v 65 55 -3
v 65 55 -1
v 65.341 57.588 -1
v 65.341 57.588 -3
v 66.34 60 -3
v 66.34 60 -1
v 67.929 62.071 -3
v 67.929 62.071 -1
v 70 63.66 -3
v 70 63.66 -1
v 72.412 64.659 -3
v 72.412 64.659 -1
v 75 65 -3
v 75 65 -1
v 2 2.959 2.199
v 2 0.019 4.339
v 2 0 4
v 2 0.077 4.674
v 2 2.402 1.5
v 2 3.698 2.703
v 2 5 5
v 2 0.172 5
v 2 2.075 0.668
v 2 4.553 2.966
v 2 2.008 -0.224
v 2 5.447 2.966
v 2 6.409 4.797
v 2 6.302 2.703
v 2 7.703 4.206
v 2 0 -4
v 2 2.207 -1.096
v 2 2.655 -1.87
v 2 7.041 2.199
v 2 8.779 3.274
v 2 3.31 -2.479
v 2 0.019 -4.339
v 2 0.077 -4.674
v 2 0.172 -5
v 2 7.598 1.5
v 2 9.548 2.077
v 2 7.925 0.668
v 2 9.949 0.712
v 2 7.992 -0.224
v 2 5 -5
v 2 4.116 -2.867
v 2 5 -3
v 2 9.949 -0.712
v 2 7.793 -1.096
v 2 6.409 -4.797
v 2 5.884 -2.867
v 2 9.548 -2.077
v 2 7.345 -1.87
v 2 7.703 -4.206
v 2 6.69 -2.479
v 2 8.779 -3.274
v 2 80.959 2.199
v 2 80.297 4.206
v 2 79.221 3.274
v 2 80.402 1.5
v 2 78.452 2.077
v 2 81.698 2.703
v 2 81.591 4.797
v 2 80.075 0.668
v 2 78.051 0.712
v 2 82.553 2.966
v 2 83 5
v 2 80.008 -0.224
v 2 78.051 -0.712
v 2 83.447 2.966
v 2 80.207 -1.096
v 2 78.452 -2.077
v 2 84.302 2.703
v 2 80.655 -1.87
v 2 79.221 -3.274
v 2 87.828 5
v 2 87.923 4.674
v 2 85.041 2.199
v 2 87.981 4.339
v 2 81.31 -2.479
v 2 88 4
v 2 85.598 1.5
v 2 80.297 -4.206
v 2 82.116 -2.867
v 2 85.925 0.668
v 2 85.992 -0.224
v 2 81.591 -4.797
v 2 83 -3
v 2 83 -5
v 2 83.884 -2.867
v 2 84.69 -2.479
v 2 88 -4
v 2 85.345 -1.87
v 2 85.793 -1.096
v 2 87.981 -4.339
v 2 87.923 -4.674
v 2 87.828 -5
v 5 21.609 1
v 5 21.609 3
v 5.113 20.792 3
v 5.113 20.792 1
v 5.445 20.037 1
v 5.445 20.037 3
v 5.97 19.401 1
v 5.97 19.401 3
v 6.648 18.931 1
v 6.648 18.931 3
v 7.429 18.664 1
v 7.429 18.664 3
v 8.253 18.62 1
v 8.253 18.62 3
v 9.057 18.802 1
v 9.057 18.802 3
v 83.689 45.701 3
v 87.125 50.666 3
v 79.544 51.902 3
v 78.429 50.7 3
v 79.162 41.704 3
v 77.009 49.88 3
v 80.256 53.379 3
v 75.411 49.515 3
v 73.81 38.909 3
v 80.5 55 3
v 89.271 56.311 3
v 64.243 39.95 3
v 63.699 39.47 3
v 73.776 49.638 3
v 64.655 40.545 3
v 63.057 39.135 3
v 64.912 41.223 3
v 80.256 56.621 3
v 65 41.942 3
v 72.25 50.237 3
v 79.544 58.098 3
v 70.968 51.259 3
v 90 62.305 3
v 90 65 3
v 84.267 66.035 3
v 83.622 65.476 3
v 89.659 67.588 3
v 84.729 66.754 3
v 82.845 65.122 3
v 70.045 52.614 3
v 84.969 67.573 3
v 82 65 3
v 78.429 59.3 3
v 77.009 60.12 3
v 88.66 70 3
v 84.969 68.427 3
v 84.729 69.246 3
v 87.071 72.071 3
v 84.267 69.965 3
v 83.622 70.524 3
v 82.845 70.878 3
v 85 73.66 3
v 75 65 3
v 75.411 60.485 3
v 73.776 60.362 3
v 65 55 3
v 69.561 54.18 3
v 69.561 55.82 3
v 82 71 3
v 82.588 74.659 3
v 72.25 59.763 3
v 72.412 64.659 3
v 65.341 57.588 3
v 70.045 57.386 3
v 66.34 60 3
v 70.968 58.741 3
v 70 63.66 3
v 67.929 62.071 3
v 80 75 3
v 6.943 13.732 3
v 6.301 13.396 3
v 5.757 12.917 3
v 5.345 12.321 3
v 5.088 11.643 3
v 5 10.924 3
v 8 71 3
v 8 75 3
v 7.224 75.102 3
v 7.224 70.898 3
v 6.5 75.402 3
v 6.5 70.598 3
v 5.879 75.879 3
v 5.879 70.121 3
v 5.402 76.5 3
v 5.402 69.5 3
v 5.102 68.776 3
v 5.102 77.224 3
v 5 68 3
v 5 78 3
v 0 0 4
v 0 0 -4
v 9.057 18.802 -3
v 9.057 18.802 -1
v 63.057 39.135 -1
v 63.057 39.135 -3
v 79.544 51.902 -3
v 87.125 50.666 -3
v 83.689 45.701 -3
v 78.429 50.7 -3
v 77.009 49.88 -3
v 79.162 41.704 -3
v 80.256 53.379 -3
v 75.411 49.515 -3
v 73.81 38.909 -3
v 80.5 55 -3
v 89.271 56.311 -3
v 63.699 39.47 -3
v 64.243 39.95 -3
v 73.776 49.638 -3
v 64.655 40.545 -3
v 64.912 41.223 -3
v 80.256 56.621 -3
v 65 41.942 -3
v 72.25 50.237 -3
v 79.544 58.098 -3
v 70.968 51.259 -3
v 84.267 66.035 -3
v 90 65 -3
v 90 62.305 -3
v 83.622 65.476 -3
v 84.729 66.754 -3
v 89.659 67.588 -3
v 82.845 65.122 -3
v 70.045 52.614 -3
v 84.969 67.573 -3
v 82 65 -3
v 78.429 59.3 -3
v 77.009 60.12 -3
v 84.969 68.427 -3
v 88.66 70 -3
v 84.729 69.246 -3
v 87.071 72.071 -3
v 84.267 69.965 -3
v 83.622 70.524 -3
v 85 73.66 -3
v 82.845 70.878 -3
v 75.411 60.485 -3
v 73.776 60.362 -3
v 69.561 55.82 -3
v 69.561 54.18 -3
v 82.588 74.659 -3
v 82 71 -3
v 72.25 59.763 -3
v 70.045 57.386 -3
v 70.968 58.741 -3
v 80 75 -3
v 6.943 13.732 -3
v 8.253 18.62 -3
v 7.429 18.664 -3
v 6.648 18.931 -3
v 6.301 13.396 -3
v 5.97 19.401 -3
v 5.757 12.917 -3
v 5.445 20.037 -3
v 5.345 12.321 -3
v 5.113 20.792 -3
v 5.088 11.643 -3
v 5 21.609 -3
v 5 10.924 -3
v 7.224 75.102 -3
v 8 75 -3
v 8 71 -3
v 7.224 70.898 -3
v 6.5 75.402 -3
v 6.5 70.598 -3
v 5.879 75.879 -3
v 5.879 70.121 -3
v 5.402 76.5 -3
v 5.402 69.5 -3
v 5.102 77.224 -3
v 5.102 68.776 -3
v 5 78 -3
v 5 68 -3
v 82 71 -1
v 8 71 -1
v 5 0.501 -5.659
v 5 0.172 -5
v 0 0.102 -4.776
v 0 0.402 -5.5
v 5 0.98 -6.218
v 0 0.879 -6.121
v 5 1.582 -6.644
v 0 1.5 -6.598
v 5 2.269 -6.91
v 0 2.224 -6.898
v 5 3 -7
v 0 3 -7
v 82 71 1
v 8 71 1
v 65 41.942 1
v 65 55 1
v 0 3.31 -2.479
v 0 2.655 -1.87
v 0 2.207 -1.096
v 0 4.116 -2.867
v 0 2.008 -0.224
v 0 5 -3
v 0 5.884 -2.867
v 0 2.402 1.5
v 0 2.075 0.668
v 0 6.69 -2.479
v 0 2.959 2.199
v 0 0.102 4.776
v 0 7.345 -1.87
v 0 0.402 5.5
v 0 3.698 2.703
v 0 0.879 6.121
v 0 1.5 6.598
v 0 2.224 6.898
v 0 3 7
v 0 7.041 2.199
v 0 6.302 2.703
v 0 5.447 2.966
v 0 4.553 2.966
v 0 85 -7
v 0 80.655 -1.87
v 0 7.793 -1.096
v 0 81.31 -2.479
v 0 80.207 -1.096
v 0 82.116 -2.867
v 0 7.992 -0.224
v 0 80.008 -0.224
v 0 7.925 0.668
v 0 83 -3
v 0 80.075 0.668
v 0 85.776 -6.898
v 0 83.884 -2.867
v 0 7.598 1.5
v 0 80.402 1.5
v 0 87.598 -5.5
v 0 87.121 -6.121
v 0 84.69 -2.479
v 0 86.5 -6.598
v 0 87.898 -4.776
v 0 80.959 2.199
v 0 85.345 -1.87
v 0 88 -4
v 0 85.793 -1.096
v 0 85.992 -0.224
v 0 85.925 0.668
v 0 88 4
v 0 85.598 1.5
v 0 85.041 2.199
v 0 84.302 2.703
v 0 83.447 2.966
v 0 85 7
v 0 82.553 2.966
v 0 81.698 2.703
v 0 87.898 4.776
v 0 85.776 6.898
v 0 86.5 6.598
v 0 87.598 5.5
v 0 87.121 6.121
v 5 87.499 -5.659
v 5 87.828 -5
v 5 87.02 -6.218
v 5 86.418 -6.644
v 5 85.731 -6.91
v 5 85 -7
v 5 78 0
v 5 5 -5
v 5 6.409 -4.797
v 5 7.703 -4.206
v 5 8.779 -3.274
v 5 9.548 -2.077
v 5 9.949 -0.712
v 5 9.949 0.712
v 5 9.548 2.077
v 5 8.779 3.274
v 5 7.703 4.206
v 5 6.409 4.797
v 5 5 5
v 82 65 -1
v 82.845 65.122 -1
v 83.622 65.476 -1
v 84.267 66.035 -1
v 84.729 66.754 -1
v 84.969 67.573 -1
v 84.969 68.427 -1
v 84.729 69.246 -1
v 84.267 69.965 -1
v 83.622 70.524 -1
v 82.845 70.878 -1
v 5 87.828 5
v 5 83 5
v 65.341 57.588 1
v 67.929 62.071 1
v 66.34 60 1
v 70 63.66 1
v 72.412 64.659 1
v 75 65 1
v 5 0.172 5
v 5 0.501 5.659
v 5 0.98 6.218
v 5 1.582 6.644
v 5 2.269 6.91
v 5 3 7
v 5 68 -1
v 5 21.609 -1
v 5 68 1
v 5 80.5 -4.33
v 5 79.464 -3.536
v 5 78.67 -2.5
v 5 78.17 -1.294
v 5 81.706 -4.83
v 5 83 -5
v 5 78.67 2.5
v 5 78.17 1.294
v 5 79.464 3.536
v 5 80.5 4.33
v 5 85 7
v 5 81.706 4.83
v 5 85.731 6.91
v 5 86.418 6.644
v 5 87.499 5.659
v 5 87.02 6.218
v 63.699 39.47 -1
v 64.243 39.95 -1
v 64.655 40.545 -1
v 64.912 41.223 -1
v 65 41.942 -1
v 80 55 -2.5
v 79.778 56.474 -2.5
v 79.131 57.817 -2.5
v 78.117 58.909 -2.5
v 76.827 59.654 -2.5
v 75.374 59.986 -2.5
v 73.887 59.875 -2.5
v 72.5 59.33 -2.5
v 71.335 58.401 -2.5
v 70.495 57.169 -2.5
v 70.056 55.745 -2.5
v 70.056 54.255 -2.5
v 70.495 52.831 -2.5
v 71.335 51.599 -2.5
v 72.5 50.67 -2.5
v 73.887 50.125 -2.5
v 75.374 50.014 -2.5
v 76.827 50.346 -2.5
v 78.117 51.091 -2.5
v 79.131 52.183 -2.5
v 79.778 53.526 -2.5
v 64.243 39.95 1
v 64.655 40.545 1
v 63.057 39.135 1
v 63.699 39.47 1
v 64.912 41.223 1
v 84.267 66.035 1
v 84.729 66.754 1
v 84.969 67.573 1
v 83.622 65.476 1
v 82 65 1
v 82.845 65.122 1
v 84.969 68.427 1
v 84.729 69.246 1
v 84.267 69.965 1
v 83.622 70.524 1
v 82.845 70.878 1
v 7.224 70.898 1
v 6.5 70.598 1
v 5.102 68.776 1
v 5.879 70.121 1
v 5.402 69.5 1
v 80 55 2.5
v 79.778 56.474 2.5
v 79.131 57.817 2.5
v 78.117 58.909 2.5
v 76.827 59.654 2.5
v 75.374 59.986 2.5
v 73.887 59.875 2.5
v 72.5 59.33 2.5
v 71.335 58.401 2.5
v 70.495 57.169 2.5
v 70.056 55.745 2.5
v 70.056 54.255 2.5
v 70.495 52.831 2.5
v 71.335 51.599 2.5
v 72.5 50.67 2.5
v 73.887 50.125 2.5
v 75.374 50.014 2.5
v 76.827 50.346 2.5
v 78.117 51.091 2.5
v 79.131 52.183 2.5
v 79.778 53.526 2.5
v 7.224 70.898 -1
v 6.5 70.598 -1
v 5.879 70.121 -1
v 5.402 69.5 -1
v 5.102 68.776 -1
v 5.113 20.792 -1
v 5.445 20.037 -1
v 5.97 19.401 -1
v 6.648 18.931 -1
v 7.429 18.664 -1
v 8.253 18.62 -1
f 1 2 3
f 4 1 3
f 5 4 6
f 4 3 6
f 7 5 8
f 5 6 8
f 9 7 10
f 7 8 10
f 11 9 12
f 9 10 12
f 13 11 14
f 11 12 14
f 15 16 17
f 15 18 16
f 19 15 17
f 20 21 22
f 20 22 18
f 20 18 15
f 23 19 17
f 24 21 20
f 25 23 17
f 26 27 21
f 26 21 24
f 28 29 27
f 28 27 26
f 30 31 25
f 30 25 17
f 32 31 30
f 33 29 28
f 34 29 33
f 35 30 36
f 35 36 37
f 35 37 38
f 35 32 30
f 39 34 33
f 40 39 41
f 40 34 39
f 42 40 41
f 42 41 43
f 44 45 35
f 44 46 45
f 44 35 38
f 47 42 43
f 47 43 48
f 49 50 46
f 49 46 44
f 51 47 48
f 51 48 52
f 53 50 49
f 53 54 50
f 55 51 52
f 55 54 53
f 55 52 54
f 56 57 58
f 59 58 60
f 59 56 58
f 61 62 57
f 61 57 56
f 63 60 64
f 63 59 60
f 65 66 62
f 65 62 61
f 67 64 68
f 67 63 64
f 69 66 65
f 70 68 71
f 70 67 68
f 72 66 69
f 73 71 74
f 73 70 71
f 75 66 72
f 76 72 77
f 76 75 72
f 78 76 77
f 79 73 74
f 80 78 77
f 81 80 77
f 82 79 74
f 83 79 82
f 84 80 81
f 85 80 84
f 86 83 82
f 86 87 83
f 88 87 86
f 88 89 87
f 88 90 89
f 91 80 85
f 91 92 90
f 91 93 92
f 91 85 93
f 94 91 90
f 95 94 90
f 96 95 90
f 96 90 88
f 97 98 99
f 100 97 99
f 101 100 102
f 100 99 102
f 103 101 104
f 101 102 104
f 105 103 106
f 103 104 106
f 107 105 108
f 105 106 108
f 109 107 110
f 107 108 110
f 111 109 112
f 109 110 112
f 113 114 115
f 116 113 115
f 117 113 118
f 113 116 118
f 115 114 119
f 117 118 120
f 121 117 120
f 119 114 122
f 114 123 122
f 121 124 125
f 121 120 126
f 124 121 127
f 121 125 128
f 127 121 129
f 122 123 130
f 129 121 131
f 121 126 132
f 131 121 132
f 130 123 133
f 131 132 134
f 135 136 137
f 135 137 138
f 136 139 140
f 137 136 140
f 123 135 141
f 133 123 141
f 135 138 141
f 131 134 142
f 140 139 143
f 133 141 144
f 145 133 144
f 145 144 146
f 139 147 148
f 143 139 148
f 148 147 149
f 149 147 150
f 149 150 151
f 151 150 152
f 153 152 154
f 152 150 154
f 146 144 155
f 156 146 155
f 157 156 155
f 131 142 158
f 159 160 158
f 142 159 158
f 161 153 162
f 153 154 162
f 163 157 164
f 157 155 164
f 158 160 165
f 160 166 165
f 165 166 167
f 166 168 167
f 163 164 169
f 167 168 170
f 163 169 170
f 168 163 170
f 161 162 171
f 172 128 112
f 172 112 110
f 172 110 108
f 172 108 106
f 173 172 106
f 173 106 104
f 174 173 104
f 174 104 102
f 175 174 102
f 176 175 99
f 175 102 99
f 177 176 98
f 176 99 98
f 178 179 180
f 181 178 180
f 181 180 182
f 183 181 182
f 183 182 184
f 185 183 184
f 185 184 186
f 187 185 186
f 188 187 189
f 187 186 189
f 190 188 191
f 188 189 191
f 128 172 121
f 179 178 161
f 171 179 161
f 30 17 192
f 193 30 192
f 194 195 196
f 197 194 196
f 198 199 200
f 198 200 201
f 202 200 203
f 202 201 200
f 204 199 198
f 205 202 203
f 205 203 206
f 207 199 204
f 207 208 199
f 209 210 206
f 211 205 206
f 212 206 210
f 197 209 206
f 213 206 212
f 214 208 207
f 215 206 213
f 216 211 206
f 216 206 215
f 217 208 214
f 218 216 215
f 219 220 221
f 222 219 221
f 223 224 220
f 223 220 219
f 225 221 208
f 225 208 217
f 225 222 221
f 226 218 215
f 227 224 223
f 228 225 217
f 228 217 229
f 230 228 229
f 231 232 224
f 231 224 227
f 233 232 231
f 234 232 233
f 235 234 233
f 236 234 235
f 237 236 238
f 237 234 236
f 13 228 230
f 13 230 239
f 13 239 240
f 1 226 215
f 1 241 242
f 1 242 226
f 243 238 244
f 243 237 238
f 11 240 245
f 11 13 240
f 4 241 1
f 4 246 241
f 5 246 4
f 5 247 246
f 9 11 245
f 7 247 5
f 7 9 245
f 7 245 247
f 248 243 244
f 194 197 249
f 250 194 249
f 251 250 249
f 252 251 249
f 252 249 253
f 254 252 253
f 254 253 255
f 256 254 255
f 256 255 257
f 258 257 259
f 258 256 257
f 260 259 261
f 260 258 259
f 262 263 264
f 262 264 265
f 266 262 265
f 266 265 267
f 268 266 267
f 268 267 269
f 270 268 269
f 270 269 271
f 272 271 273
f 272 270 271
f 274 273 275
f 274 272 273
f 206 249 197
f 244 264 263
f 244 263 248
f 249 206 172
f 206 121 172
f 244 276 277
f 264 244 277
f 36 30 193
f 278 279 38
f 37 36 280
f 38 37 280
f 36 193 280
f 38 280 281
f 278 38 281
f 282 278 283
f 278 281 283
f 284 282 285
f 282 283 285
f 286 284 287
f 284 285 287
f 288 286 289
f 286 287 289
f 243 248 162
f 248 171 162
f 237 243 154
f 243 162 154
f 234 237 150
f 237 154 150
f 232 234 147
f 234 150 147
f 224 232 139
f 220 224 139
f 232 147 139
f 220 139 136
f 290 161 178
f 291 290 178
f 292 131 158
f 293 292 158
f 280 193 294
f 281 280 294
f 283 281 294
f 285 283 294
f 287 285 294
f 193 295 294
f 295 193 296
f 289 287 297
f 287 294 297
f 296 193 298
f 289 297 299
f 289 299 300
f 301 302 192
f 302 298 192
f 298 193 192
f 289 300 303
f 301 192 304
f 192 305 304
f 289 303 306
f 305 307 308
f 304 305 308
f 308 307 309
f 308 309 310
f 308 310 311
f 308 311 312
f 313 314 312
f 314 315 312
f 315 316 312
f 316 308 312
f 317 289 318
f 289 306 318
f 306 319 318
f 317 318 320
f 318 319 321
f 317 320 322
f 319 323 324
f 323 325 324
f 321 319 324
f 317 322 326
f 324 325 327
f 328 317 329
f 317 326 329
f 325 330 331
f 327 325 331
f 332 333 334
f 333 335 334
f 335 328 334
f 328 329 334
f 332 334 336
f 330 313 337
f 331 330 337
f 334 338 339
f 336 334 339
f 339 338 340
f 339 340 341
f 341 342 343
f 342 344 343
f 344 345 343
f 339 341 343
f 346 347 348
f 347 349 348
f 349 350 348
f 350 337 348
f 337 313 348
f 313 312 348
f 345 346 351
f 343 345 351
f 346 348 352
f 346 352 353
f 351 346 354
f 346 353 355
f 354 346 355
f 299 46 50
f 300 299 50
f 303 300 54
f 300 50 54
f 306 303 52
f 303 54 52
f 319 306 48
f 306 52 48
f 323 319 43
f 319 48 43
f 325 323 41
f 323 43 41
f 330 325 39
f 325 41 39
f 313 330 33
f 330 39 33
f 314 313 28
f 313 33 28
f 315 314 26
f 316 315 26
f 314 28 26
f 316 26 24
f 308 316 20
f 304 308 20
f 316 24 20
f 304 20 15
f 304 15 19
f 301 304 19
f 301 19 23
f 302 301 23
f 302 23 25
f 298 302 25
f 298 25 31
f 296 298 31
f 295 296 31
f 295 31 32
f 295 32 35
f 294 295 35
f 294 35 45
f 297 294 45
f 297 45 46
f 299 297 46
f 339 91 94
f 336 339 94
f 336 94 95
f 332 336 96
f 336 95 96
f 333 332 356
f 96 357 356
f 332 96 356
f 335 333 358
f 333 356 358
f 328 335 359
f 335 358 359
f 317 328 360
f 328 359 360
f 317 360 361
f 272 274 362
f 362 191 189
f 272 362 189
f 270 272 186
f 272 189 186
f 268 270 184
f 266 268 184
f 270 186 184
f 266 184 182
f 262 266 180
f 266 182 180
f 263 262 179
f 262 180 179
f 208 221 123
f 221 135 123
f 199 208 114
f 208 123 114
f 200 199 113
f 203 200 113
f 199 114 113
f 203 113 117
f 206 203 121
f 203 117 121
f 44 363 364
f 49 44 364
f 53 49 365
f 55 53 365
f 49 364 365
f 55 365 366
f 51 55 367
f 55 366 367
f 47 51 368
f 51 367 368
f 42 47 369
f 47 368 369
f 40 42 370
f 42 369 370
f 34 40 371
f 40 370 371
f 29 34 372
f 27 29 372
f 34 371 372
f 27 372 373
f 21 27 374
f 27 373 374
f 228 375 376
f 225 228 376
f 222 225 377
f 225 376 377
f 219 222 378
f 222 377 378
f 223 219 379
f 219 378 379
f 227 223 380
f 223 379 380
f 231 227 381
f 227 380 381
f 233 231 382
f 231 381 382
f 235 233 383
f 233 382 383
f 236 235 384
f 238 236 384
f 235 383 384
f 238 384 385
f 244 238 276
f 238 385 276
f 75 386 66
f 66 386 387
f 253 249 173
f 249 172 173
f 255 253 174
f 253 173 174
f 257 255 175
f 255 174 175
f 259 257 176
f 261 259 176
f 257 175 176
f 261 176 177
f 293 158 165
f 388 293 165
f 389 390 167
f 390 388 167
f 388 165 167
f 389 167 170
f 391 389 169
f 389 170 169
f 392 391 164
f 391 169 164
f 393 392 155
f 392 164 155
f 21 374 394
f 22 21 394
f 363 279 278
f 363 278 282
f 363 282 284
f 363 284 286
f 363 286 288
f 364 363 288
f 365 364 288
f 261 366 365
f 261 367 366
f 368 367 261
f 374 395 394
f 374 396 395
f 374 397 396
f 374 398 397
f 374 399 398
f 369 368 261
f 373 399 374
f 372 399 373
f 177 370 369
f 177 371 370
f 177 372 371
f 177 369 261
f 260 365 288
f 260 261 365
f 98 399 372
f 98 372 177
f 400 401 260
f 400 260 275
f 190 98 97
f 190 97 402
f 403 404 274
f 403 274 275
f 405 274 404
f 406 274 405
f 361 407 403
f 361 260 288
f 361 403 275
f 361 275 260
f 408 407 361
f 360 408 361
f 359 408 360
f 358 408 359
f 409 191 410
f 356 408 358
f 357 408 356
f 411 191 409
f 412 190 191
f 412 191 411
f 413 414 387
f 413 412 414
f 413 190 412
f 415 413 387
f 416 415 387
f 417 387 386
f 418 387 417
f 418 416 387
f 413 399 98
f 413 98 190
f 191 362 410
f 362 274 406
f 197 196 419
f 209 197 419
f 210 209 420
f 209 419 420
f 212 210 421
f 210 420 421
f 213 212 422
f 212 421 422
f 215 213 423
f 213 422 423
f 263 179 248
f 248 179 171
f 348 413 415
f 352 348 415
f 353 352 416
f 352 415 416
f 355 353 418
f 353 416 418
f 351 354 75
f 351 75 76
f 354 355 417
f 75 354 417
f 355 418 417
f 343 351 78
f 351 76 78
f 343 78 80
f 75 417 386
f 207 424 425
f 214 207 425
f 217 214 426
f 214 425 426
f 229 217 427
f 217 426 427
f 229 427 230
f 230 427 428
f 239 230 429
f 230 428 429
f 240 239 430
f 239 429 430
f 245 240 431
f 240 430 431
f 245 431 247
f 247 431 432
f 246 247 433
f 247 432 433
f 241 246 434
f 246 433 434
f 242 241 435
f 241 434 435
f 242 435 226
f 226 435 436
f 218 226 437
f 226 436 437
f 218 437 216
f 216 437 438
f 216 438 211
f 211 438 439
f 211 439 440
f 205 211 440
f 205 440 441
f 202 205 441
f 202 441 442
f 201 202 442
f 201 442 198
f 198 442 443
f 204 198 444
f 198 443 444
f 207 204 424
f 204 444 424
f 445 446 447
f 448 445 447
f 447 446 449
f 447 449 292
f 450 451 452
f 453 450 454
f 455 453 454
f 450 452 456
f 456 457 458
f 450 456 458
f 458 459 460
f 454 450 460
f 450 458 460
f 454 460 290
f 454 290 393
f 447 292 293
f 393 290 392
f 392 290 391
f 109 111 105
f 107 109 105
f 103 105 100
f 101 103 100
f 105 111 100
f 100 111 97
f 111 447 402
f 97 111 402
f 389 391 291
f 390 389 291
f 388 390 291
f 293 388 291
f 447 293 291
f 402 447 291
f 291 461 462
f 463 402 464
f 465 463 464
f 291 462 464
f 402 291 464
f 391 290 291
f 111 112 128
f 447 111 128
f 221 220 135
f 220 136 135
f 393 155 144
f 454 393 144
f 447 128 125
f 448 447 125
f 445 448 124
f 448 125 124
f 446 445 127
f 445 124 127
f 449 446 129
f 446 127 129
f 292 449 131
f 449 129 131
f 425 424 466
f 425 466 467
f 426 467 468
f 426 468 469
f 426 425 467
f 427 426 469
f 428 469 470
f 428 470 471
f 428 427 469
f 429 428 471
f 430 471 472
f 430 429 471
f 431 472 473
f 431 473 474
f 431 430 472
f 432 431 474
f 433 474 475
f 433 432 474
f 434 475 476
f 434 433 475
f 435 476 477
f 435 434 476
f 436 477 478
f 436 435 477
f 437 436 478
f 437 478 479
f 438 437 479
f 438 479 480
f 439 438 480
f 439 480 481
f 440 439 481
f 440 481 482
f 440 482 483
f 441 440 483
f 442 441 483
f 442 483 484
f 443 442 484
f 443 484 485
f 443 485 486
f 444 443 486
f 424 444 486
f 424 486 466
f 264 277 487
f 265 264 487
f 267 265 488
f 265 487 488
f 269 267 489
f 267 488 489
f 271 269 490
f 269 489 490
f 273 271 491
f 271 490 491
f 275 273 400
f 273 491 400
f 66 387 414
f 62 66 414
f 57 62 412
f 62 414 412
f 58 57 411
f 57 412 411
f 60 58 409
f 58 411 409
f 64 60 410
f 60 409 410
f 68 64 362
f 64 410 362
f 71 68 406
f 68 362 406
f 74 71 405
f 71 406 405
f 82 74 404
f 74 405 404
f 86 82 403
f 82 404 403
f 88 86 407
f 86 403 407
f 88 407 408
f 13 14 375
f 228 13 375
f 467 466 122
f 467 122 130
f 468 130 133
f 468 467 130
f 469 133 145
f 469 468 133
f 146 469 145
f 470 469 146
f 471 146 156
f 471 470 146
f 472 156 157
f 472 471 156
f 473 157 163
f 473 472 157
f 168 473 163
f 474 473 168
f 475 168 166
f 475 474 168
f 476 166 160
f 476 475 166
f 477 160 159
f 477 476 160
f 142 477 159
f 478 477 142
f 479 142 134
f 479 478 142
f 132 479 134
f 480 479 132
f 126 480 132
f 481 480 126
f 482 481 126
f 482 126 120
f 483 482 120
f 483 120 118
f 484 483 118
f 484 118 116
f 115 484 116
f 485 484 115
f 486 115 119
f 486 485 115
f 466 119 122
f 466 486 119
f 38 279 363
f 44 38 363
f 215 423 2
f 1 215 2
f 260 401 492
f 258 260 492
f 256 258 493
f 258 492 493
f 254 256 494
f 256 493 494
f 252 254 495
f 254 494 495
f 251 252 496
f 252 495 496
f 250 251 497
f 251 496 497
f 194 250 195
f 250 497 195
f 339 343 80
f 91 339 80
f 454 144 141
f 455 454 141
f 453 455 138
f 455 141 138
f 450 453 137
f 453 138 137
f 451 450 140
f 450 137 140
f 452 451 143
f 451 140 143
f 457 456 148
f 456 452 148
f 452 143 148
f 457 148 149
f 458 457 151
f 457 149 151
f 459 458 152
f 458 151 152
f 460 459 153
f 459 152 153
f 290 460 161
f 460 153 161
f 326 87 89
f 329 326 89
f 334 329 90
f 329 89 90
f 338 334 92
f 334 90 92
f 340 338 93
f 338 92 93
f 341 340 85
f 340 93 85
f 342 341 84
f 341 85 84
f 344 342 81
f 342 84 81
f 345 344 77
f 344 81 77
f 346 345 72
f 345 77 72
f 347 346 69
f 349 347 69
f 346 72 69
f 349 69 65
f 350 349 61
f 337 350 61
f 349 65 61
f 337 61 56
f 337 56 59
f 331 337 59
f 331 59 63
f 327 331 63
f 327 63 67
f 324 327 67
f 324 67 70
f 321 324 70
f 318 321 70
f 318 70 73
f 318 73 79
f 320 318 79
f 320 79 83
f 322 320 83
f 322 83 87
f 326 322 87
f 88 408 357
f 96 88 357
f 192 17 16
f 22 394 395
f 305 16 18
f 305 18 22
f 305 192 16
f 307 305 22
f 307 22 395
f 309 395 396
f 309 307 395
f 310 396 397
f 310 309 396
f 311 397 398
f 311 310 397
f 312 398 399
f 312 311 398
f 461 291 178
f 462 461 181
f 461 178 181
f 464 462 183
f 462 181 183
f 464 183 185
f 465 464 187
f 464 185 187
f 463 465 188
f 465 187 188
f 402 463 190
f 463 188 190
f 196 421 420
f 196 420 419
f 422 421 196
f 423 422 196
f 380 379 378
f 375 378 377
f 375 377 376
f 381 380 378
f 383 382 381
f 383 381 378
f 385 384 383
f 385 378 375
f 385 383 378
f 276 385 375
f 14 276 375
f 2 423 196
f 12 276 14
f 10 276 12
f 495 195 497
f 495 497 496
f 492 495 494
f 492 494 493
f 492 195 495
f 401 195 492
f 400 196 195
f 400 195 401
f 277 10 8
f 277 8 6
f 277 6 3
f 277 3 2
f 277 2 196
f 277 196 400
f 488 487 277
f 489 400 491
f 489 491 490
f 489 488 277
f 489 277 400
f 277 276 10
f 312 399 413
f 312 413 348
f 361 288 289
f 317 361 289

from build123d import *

# Parameters (mm, degrees)
EXTRUDE_2_DEPTH     = 7
SKETCH_2_10_R       = 5
EXTRUDE_6_DEPTH     = 3
EXTRUDE_7_DEPTH     = 1
SKETCH_5_R          = 3
CUT_EXTRUDE_1_DEPTH = 3
SKETCH_5_5_R        = 3
CUT_EXTRUDE_2_DEPTH = 123.547949799
FILLET_1_R          = 3
CHAMFER_2_SIZE      = 0.5


with BuildPart() as part:
    # Эскиз2 → Бобышка-Вытянуть2 (new, symmetric)
    with BuildSketch(Plane.XY):
        Polygon((5, 21.609375634), (5, 68), (5, 78), (5, 88), (0, 88), (0, 0), (5, 0), (5, 10.923979425), align=None)
    extrude(amount=EXTRUDE_2_DEPTH, both=True)

    # Эскиз2<10> → Бобышка-Вытянуть6 (add, symmetric)
    with BuildSketch(Plane.XY):
        with BuildLine():
            Line((82, 65), (75, 65))
            ThreePointArc((75, 65), (67.928932188, 62.071067812), (65, 55))
            Line((65, 55), (65, 41.942144818))
            ThreePointArc((65, 41.942144818), (64.466923843, 40.2350166), (63.057142165, 39.134574615))
            Line((63.057142165, 39.134574615), (9.057142165, 18.801805431))
            ThreePointArc((9.057142165, 18.801805431), (6.292871782, 19.142451791), (5, 21.609375634))
            Line((5, 21.609375634), (5, 10.923979425))
            ThreePointArc((5, 10.923979425), (5.533076157, 12.631107643), (6.942857835, 13.731549628))
            Line((6.942857835, 13.731549628), (73.80951804, 38.909037925))
            ThreePointArc((73.80951804, 38.909037925), (85.557698692, 48.079387798), (90, 62.305456282))
            Line((90, 62.305456282), (90, 65))
            ThreePointArc((90, 65), (87.071067812, 72.071067812), (80, 75))
            Line((80, 75), (8, 75))
            ThreePointArc((8, 75), (5.878679656, 75.878679656), (5, 78))
            Line((5, 78), (5, 68))
            ThreePointArc((5, 68), (5.878679656, 70.121320344), (8, 71))
            Line((8, 71), (82, 71))
            ThreePointArc((82, 71), (85, 68), (82, 65))
        make_face()
        with Locations((75, 55)):
            Circle(SKETCH_2_10_R, mode=Mode.SUBTRACT)
    extrude(amount=EXTRUDE_6_DEPTH, both=True)

    # Эскиз2<11> → Бобышка-Вытянуть7 (add, symmetric)
    with BuildSketch(Plane.XY):
        with BuildLine():
            ThreePointArc((65, 55), (67.928932188, 62.071067812), (75, 65))
            Line((75, 65), (82, 65))
            ThreePointArc((82, 65), (85, 68), (82, 71))
            Line((82, 71), (8, 71))
            ThreePointArc((8, 71), (5.878679656, 70.121320344), (5, 68))
            Line((5, 68), (5, 21.609375634))
            ThreePointArc((5, 21.609375634), (6.292871782, 19.142451791), (9.057142165, 18.801805431))
            Line((9.057142165, 18.801805431), (63.057142165, 39.134574615))
            ThreePointArc((63.057142165, 39.134574615), (64.466923843, 40.2350166), (65, 41.942144818))
            Line((65, 41.942144818), (65, 55))
        make_face()
    extrude(amount=EXTRUDE_7_DEPTH, both=True)

    # Эскиз5 → Вырез-Вытянуть1 (cut)
    # profile 1 of 2: a face of its own
    with BuildSketch(Plane(origin=(5, 0, 0), x_dir=(0, 0, -1), z_dir=(1, 0, 0))):
        with BuildLine():
            Line((-5, 0), (0, 0))
            Line((0, 0), (5, 0))
            Line((5, 0), (5, 5))
            ThreePointArc((5, 5), (0, 10), (-5, 5))
            Line((-5, 5), (-5, 0))
        make_face()
        with Locations((0, 5)):
            Circle(SKETCH_5_R, mode=Mode.SUBTRACT)
    # profile 2 of 2: a face of its own
    with BuildSketch(Plane(origin=(5, 0, 0), x_dir=(0, 0, -1), z_dir=(1, 0, 0))):
        with BuildLine():
            Line((-5, 88), (-5, 83))
            ThreePointArc((-5, 83), (0, 78), (5, 83))
            Line((5, 83), (5, 88))
            Line((5, 88), (-5, 88))
        make_face()
        with Locations((0, 83)):
            Circle(SKETCH_5_R, mode=Mode.SUBTRACT)
    extrude(amount=-CUT_EXTRUDE_1_DEPTH, mode=Mode.SUBTRACT)

    # Эскиз5<5> → Вырез-Вытянуть2 (cut, through all)
    with BuildSketch(Plane(origin=(5, 0, 0), x_dir=(0, 0, -1), z_dir=(1, 0, 0))):
        with Locations((0, 83)):
            Circle(SKETCH_5_5_R)
        with Locations((0, 5)):
            Circle(SKETCH_5_5_R)
    extrude(amount=-CUT_EXTRUDE_2_DEPTH, mode=Mode.SUBTRACT)

    # Скругление1
    fillet_1_edges = [part.edges().sort_by_distance(p)[0] for p in [
        (2.5, 0, 7),
        (2.5, 0, -7),
        (2.5, 88, -7),
        (2.5, 88, 7),
    ]]
    fillet(fillet_1_edges, radius=FILLET_1_R)

    # Фаска2
    chamfer_2_edges = [part.edges().sort_by_distance(p)[0] for p in [
        (70, 55, -3),
        (70, 55, 3),
    ]]
    chamfer(chamfer_2_edges, length=CHAMFER_2_SIZE)


solid = part.part
